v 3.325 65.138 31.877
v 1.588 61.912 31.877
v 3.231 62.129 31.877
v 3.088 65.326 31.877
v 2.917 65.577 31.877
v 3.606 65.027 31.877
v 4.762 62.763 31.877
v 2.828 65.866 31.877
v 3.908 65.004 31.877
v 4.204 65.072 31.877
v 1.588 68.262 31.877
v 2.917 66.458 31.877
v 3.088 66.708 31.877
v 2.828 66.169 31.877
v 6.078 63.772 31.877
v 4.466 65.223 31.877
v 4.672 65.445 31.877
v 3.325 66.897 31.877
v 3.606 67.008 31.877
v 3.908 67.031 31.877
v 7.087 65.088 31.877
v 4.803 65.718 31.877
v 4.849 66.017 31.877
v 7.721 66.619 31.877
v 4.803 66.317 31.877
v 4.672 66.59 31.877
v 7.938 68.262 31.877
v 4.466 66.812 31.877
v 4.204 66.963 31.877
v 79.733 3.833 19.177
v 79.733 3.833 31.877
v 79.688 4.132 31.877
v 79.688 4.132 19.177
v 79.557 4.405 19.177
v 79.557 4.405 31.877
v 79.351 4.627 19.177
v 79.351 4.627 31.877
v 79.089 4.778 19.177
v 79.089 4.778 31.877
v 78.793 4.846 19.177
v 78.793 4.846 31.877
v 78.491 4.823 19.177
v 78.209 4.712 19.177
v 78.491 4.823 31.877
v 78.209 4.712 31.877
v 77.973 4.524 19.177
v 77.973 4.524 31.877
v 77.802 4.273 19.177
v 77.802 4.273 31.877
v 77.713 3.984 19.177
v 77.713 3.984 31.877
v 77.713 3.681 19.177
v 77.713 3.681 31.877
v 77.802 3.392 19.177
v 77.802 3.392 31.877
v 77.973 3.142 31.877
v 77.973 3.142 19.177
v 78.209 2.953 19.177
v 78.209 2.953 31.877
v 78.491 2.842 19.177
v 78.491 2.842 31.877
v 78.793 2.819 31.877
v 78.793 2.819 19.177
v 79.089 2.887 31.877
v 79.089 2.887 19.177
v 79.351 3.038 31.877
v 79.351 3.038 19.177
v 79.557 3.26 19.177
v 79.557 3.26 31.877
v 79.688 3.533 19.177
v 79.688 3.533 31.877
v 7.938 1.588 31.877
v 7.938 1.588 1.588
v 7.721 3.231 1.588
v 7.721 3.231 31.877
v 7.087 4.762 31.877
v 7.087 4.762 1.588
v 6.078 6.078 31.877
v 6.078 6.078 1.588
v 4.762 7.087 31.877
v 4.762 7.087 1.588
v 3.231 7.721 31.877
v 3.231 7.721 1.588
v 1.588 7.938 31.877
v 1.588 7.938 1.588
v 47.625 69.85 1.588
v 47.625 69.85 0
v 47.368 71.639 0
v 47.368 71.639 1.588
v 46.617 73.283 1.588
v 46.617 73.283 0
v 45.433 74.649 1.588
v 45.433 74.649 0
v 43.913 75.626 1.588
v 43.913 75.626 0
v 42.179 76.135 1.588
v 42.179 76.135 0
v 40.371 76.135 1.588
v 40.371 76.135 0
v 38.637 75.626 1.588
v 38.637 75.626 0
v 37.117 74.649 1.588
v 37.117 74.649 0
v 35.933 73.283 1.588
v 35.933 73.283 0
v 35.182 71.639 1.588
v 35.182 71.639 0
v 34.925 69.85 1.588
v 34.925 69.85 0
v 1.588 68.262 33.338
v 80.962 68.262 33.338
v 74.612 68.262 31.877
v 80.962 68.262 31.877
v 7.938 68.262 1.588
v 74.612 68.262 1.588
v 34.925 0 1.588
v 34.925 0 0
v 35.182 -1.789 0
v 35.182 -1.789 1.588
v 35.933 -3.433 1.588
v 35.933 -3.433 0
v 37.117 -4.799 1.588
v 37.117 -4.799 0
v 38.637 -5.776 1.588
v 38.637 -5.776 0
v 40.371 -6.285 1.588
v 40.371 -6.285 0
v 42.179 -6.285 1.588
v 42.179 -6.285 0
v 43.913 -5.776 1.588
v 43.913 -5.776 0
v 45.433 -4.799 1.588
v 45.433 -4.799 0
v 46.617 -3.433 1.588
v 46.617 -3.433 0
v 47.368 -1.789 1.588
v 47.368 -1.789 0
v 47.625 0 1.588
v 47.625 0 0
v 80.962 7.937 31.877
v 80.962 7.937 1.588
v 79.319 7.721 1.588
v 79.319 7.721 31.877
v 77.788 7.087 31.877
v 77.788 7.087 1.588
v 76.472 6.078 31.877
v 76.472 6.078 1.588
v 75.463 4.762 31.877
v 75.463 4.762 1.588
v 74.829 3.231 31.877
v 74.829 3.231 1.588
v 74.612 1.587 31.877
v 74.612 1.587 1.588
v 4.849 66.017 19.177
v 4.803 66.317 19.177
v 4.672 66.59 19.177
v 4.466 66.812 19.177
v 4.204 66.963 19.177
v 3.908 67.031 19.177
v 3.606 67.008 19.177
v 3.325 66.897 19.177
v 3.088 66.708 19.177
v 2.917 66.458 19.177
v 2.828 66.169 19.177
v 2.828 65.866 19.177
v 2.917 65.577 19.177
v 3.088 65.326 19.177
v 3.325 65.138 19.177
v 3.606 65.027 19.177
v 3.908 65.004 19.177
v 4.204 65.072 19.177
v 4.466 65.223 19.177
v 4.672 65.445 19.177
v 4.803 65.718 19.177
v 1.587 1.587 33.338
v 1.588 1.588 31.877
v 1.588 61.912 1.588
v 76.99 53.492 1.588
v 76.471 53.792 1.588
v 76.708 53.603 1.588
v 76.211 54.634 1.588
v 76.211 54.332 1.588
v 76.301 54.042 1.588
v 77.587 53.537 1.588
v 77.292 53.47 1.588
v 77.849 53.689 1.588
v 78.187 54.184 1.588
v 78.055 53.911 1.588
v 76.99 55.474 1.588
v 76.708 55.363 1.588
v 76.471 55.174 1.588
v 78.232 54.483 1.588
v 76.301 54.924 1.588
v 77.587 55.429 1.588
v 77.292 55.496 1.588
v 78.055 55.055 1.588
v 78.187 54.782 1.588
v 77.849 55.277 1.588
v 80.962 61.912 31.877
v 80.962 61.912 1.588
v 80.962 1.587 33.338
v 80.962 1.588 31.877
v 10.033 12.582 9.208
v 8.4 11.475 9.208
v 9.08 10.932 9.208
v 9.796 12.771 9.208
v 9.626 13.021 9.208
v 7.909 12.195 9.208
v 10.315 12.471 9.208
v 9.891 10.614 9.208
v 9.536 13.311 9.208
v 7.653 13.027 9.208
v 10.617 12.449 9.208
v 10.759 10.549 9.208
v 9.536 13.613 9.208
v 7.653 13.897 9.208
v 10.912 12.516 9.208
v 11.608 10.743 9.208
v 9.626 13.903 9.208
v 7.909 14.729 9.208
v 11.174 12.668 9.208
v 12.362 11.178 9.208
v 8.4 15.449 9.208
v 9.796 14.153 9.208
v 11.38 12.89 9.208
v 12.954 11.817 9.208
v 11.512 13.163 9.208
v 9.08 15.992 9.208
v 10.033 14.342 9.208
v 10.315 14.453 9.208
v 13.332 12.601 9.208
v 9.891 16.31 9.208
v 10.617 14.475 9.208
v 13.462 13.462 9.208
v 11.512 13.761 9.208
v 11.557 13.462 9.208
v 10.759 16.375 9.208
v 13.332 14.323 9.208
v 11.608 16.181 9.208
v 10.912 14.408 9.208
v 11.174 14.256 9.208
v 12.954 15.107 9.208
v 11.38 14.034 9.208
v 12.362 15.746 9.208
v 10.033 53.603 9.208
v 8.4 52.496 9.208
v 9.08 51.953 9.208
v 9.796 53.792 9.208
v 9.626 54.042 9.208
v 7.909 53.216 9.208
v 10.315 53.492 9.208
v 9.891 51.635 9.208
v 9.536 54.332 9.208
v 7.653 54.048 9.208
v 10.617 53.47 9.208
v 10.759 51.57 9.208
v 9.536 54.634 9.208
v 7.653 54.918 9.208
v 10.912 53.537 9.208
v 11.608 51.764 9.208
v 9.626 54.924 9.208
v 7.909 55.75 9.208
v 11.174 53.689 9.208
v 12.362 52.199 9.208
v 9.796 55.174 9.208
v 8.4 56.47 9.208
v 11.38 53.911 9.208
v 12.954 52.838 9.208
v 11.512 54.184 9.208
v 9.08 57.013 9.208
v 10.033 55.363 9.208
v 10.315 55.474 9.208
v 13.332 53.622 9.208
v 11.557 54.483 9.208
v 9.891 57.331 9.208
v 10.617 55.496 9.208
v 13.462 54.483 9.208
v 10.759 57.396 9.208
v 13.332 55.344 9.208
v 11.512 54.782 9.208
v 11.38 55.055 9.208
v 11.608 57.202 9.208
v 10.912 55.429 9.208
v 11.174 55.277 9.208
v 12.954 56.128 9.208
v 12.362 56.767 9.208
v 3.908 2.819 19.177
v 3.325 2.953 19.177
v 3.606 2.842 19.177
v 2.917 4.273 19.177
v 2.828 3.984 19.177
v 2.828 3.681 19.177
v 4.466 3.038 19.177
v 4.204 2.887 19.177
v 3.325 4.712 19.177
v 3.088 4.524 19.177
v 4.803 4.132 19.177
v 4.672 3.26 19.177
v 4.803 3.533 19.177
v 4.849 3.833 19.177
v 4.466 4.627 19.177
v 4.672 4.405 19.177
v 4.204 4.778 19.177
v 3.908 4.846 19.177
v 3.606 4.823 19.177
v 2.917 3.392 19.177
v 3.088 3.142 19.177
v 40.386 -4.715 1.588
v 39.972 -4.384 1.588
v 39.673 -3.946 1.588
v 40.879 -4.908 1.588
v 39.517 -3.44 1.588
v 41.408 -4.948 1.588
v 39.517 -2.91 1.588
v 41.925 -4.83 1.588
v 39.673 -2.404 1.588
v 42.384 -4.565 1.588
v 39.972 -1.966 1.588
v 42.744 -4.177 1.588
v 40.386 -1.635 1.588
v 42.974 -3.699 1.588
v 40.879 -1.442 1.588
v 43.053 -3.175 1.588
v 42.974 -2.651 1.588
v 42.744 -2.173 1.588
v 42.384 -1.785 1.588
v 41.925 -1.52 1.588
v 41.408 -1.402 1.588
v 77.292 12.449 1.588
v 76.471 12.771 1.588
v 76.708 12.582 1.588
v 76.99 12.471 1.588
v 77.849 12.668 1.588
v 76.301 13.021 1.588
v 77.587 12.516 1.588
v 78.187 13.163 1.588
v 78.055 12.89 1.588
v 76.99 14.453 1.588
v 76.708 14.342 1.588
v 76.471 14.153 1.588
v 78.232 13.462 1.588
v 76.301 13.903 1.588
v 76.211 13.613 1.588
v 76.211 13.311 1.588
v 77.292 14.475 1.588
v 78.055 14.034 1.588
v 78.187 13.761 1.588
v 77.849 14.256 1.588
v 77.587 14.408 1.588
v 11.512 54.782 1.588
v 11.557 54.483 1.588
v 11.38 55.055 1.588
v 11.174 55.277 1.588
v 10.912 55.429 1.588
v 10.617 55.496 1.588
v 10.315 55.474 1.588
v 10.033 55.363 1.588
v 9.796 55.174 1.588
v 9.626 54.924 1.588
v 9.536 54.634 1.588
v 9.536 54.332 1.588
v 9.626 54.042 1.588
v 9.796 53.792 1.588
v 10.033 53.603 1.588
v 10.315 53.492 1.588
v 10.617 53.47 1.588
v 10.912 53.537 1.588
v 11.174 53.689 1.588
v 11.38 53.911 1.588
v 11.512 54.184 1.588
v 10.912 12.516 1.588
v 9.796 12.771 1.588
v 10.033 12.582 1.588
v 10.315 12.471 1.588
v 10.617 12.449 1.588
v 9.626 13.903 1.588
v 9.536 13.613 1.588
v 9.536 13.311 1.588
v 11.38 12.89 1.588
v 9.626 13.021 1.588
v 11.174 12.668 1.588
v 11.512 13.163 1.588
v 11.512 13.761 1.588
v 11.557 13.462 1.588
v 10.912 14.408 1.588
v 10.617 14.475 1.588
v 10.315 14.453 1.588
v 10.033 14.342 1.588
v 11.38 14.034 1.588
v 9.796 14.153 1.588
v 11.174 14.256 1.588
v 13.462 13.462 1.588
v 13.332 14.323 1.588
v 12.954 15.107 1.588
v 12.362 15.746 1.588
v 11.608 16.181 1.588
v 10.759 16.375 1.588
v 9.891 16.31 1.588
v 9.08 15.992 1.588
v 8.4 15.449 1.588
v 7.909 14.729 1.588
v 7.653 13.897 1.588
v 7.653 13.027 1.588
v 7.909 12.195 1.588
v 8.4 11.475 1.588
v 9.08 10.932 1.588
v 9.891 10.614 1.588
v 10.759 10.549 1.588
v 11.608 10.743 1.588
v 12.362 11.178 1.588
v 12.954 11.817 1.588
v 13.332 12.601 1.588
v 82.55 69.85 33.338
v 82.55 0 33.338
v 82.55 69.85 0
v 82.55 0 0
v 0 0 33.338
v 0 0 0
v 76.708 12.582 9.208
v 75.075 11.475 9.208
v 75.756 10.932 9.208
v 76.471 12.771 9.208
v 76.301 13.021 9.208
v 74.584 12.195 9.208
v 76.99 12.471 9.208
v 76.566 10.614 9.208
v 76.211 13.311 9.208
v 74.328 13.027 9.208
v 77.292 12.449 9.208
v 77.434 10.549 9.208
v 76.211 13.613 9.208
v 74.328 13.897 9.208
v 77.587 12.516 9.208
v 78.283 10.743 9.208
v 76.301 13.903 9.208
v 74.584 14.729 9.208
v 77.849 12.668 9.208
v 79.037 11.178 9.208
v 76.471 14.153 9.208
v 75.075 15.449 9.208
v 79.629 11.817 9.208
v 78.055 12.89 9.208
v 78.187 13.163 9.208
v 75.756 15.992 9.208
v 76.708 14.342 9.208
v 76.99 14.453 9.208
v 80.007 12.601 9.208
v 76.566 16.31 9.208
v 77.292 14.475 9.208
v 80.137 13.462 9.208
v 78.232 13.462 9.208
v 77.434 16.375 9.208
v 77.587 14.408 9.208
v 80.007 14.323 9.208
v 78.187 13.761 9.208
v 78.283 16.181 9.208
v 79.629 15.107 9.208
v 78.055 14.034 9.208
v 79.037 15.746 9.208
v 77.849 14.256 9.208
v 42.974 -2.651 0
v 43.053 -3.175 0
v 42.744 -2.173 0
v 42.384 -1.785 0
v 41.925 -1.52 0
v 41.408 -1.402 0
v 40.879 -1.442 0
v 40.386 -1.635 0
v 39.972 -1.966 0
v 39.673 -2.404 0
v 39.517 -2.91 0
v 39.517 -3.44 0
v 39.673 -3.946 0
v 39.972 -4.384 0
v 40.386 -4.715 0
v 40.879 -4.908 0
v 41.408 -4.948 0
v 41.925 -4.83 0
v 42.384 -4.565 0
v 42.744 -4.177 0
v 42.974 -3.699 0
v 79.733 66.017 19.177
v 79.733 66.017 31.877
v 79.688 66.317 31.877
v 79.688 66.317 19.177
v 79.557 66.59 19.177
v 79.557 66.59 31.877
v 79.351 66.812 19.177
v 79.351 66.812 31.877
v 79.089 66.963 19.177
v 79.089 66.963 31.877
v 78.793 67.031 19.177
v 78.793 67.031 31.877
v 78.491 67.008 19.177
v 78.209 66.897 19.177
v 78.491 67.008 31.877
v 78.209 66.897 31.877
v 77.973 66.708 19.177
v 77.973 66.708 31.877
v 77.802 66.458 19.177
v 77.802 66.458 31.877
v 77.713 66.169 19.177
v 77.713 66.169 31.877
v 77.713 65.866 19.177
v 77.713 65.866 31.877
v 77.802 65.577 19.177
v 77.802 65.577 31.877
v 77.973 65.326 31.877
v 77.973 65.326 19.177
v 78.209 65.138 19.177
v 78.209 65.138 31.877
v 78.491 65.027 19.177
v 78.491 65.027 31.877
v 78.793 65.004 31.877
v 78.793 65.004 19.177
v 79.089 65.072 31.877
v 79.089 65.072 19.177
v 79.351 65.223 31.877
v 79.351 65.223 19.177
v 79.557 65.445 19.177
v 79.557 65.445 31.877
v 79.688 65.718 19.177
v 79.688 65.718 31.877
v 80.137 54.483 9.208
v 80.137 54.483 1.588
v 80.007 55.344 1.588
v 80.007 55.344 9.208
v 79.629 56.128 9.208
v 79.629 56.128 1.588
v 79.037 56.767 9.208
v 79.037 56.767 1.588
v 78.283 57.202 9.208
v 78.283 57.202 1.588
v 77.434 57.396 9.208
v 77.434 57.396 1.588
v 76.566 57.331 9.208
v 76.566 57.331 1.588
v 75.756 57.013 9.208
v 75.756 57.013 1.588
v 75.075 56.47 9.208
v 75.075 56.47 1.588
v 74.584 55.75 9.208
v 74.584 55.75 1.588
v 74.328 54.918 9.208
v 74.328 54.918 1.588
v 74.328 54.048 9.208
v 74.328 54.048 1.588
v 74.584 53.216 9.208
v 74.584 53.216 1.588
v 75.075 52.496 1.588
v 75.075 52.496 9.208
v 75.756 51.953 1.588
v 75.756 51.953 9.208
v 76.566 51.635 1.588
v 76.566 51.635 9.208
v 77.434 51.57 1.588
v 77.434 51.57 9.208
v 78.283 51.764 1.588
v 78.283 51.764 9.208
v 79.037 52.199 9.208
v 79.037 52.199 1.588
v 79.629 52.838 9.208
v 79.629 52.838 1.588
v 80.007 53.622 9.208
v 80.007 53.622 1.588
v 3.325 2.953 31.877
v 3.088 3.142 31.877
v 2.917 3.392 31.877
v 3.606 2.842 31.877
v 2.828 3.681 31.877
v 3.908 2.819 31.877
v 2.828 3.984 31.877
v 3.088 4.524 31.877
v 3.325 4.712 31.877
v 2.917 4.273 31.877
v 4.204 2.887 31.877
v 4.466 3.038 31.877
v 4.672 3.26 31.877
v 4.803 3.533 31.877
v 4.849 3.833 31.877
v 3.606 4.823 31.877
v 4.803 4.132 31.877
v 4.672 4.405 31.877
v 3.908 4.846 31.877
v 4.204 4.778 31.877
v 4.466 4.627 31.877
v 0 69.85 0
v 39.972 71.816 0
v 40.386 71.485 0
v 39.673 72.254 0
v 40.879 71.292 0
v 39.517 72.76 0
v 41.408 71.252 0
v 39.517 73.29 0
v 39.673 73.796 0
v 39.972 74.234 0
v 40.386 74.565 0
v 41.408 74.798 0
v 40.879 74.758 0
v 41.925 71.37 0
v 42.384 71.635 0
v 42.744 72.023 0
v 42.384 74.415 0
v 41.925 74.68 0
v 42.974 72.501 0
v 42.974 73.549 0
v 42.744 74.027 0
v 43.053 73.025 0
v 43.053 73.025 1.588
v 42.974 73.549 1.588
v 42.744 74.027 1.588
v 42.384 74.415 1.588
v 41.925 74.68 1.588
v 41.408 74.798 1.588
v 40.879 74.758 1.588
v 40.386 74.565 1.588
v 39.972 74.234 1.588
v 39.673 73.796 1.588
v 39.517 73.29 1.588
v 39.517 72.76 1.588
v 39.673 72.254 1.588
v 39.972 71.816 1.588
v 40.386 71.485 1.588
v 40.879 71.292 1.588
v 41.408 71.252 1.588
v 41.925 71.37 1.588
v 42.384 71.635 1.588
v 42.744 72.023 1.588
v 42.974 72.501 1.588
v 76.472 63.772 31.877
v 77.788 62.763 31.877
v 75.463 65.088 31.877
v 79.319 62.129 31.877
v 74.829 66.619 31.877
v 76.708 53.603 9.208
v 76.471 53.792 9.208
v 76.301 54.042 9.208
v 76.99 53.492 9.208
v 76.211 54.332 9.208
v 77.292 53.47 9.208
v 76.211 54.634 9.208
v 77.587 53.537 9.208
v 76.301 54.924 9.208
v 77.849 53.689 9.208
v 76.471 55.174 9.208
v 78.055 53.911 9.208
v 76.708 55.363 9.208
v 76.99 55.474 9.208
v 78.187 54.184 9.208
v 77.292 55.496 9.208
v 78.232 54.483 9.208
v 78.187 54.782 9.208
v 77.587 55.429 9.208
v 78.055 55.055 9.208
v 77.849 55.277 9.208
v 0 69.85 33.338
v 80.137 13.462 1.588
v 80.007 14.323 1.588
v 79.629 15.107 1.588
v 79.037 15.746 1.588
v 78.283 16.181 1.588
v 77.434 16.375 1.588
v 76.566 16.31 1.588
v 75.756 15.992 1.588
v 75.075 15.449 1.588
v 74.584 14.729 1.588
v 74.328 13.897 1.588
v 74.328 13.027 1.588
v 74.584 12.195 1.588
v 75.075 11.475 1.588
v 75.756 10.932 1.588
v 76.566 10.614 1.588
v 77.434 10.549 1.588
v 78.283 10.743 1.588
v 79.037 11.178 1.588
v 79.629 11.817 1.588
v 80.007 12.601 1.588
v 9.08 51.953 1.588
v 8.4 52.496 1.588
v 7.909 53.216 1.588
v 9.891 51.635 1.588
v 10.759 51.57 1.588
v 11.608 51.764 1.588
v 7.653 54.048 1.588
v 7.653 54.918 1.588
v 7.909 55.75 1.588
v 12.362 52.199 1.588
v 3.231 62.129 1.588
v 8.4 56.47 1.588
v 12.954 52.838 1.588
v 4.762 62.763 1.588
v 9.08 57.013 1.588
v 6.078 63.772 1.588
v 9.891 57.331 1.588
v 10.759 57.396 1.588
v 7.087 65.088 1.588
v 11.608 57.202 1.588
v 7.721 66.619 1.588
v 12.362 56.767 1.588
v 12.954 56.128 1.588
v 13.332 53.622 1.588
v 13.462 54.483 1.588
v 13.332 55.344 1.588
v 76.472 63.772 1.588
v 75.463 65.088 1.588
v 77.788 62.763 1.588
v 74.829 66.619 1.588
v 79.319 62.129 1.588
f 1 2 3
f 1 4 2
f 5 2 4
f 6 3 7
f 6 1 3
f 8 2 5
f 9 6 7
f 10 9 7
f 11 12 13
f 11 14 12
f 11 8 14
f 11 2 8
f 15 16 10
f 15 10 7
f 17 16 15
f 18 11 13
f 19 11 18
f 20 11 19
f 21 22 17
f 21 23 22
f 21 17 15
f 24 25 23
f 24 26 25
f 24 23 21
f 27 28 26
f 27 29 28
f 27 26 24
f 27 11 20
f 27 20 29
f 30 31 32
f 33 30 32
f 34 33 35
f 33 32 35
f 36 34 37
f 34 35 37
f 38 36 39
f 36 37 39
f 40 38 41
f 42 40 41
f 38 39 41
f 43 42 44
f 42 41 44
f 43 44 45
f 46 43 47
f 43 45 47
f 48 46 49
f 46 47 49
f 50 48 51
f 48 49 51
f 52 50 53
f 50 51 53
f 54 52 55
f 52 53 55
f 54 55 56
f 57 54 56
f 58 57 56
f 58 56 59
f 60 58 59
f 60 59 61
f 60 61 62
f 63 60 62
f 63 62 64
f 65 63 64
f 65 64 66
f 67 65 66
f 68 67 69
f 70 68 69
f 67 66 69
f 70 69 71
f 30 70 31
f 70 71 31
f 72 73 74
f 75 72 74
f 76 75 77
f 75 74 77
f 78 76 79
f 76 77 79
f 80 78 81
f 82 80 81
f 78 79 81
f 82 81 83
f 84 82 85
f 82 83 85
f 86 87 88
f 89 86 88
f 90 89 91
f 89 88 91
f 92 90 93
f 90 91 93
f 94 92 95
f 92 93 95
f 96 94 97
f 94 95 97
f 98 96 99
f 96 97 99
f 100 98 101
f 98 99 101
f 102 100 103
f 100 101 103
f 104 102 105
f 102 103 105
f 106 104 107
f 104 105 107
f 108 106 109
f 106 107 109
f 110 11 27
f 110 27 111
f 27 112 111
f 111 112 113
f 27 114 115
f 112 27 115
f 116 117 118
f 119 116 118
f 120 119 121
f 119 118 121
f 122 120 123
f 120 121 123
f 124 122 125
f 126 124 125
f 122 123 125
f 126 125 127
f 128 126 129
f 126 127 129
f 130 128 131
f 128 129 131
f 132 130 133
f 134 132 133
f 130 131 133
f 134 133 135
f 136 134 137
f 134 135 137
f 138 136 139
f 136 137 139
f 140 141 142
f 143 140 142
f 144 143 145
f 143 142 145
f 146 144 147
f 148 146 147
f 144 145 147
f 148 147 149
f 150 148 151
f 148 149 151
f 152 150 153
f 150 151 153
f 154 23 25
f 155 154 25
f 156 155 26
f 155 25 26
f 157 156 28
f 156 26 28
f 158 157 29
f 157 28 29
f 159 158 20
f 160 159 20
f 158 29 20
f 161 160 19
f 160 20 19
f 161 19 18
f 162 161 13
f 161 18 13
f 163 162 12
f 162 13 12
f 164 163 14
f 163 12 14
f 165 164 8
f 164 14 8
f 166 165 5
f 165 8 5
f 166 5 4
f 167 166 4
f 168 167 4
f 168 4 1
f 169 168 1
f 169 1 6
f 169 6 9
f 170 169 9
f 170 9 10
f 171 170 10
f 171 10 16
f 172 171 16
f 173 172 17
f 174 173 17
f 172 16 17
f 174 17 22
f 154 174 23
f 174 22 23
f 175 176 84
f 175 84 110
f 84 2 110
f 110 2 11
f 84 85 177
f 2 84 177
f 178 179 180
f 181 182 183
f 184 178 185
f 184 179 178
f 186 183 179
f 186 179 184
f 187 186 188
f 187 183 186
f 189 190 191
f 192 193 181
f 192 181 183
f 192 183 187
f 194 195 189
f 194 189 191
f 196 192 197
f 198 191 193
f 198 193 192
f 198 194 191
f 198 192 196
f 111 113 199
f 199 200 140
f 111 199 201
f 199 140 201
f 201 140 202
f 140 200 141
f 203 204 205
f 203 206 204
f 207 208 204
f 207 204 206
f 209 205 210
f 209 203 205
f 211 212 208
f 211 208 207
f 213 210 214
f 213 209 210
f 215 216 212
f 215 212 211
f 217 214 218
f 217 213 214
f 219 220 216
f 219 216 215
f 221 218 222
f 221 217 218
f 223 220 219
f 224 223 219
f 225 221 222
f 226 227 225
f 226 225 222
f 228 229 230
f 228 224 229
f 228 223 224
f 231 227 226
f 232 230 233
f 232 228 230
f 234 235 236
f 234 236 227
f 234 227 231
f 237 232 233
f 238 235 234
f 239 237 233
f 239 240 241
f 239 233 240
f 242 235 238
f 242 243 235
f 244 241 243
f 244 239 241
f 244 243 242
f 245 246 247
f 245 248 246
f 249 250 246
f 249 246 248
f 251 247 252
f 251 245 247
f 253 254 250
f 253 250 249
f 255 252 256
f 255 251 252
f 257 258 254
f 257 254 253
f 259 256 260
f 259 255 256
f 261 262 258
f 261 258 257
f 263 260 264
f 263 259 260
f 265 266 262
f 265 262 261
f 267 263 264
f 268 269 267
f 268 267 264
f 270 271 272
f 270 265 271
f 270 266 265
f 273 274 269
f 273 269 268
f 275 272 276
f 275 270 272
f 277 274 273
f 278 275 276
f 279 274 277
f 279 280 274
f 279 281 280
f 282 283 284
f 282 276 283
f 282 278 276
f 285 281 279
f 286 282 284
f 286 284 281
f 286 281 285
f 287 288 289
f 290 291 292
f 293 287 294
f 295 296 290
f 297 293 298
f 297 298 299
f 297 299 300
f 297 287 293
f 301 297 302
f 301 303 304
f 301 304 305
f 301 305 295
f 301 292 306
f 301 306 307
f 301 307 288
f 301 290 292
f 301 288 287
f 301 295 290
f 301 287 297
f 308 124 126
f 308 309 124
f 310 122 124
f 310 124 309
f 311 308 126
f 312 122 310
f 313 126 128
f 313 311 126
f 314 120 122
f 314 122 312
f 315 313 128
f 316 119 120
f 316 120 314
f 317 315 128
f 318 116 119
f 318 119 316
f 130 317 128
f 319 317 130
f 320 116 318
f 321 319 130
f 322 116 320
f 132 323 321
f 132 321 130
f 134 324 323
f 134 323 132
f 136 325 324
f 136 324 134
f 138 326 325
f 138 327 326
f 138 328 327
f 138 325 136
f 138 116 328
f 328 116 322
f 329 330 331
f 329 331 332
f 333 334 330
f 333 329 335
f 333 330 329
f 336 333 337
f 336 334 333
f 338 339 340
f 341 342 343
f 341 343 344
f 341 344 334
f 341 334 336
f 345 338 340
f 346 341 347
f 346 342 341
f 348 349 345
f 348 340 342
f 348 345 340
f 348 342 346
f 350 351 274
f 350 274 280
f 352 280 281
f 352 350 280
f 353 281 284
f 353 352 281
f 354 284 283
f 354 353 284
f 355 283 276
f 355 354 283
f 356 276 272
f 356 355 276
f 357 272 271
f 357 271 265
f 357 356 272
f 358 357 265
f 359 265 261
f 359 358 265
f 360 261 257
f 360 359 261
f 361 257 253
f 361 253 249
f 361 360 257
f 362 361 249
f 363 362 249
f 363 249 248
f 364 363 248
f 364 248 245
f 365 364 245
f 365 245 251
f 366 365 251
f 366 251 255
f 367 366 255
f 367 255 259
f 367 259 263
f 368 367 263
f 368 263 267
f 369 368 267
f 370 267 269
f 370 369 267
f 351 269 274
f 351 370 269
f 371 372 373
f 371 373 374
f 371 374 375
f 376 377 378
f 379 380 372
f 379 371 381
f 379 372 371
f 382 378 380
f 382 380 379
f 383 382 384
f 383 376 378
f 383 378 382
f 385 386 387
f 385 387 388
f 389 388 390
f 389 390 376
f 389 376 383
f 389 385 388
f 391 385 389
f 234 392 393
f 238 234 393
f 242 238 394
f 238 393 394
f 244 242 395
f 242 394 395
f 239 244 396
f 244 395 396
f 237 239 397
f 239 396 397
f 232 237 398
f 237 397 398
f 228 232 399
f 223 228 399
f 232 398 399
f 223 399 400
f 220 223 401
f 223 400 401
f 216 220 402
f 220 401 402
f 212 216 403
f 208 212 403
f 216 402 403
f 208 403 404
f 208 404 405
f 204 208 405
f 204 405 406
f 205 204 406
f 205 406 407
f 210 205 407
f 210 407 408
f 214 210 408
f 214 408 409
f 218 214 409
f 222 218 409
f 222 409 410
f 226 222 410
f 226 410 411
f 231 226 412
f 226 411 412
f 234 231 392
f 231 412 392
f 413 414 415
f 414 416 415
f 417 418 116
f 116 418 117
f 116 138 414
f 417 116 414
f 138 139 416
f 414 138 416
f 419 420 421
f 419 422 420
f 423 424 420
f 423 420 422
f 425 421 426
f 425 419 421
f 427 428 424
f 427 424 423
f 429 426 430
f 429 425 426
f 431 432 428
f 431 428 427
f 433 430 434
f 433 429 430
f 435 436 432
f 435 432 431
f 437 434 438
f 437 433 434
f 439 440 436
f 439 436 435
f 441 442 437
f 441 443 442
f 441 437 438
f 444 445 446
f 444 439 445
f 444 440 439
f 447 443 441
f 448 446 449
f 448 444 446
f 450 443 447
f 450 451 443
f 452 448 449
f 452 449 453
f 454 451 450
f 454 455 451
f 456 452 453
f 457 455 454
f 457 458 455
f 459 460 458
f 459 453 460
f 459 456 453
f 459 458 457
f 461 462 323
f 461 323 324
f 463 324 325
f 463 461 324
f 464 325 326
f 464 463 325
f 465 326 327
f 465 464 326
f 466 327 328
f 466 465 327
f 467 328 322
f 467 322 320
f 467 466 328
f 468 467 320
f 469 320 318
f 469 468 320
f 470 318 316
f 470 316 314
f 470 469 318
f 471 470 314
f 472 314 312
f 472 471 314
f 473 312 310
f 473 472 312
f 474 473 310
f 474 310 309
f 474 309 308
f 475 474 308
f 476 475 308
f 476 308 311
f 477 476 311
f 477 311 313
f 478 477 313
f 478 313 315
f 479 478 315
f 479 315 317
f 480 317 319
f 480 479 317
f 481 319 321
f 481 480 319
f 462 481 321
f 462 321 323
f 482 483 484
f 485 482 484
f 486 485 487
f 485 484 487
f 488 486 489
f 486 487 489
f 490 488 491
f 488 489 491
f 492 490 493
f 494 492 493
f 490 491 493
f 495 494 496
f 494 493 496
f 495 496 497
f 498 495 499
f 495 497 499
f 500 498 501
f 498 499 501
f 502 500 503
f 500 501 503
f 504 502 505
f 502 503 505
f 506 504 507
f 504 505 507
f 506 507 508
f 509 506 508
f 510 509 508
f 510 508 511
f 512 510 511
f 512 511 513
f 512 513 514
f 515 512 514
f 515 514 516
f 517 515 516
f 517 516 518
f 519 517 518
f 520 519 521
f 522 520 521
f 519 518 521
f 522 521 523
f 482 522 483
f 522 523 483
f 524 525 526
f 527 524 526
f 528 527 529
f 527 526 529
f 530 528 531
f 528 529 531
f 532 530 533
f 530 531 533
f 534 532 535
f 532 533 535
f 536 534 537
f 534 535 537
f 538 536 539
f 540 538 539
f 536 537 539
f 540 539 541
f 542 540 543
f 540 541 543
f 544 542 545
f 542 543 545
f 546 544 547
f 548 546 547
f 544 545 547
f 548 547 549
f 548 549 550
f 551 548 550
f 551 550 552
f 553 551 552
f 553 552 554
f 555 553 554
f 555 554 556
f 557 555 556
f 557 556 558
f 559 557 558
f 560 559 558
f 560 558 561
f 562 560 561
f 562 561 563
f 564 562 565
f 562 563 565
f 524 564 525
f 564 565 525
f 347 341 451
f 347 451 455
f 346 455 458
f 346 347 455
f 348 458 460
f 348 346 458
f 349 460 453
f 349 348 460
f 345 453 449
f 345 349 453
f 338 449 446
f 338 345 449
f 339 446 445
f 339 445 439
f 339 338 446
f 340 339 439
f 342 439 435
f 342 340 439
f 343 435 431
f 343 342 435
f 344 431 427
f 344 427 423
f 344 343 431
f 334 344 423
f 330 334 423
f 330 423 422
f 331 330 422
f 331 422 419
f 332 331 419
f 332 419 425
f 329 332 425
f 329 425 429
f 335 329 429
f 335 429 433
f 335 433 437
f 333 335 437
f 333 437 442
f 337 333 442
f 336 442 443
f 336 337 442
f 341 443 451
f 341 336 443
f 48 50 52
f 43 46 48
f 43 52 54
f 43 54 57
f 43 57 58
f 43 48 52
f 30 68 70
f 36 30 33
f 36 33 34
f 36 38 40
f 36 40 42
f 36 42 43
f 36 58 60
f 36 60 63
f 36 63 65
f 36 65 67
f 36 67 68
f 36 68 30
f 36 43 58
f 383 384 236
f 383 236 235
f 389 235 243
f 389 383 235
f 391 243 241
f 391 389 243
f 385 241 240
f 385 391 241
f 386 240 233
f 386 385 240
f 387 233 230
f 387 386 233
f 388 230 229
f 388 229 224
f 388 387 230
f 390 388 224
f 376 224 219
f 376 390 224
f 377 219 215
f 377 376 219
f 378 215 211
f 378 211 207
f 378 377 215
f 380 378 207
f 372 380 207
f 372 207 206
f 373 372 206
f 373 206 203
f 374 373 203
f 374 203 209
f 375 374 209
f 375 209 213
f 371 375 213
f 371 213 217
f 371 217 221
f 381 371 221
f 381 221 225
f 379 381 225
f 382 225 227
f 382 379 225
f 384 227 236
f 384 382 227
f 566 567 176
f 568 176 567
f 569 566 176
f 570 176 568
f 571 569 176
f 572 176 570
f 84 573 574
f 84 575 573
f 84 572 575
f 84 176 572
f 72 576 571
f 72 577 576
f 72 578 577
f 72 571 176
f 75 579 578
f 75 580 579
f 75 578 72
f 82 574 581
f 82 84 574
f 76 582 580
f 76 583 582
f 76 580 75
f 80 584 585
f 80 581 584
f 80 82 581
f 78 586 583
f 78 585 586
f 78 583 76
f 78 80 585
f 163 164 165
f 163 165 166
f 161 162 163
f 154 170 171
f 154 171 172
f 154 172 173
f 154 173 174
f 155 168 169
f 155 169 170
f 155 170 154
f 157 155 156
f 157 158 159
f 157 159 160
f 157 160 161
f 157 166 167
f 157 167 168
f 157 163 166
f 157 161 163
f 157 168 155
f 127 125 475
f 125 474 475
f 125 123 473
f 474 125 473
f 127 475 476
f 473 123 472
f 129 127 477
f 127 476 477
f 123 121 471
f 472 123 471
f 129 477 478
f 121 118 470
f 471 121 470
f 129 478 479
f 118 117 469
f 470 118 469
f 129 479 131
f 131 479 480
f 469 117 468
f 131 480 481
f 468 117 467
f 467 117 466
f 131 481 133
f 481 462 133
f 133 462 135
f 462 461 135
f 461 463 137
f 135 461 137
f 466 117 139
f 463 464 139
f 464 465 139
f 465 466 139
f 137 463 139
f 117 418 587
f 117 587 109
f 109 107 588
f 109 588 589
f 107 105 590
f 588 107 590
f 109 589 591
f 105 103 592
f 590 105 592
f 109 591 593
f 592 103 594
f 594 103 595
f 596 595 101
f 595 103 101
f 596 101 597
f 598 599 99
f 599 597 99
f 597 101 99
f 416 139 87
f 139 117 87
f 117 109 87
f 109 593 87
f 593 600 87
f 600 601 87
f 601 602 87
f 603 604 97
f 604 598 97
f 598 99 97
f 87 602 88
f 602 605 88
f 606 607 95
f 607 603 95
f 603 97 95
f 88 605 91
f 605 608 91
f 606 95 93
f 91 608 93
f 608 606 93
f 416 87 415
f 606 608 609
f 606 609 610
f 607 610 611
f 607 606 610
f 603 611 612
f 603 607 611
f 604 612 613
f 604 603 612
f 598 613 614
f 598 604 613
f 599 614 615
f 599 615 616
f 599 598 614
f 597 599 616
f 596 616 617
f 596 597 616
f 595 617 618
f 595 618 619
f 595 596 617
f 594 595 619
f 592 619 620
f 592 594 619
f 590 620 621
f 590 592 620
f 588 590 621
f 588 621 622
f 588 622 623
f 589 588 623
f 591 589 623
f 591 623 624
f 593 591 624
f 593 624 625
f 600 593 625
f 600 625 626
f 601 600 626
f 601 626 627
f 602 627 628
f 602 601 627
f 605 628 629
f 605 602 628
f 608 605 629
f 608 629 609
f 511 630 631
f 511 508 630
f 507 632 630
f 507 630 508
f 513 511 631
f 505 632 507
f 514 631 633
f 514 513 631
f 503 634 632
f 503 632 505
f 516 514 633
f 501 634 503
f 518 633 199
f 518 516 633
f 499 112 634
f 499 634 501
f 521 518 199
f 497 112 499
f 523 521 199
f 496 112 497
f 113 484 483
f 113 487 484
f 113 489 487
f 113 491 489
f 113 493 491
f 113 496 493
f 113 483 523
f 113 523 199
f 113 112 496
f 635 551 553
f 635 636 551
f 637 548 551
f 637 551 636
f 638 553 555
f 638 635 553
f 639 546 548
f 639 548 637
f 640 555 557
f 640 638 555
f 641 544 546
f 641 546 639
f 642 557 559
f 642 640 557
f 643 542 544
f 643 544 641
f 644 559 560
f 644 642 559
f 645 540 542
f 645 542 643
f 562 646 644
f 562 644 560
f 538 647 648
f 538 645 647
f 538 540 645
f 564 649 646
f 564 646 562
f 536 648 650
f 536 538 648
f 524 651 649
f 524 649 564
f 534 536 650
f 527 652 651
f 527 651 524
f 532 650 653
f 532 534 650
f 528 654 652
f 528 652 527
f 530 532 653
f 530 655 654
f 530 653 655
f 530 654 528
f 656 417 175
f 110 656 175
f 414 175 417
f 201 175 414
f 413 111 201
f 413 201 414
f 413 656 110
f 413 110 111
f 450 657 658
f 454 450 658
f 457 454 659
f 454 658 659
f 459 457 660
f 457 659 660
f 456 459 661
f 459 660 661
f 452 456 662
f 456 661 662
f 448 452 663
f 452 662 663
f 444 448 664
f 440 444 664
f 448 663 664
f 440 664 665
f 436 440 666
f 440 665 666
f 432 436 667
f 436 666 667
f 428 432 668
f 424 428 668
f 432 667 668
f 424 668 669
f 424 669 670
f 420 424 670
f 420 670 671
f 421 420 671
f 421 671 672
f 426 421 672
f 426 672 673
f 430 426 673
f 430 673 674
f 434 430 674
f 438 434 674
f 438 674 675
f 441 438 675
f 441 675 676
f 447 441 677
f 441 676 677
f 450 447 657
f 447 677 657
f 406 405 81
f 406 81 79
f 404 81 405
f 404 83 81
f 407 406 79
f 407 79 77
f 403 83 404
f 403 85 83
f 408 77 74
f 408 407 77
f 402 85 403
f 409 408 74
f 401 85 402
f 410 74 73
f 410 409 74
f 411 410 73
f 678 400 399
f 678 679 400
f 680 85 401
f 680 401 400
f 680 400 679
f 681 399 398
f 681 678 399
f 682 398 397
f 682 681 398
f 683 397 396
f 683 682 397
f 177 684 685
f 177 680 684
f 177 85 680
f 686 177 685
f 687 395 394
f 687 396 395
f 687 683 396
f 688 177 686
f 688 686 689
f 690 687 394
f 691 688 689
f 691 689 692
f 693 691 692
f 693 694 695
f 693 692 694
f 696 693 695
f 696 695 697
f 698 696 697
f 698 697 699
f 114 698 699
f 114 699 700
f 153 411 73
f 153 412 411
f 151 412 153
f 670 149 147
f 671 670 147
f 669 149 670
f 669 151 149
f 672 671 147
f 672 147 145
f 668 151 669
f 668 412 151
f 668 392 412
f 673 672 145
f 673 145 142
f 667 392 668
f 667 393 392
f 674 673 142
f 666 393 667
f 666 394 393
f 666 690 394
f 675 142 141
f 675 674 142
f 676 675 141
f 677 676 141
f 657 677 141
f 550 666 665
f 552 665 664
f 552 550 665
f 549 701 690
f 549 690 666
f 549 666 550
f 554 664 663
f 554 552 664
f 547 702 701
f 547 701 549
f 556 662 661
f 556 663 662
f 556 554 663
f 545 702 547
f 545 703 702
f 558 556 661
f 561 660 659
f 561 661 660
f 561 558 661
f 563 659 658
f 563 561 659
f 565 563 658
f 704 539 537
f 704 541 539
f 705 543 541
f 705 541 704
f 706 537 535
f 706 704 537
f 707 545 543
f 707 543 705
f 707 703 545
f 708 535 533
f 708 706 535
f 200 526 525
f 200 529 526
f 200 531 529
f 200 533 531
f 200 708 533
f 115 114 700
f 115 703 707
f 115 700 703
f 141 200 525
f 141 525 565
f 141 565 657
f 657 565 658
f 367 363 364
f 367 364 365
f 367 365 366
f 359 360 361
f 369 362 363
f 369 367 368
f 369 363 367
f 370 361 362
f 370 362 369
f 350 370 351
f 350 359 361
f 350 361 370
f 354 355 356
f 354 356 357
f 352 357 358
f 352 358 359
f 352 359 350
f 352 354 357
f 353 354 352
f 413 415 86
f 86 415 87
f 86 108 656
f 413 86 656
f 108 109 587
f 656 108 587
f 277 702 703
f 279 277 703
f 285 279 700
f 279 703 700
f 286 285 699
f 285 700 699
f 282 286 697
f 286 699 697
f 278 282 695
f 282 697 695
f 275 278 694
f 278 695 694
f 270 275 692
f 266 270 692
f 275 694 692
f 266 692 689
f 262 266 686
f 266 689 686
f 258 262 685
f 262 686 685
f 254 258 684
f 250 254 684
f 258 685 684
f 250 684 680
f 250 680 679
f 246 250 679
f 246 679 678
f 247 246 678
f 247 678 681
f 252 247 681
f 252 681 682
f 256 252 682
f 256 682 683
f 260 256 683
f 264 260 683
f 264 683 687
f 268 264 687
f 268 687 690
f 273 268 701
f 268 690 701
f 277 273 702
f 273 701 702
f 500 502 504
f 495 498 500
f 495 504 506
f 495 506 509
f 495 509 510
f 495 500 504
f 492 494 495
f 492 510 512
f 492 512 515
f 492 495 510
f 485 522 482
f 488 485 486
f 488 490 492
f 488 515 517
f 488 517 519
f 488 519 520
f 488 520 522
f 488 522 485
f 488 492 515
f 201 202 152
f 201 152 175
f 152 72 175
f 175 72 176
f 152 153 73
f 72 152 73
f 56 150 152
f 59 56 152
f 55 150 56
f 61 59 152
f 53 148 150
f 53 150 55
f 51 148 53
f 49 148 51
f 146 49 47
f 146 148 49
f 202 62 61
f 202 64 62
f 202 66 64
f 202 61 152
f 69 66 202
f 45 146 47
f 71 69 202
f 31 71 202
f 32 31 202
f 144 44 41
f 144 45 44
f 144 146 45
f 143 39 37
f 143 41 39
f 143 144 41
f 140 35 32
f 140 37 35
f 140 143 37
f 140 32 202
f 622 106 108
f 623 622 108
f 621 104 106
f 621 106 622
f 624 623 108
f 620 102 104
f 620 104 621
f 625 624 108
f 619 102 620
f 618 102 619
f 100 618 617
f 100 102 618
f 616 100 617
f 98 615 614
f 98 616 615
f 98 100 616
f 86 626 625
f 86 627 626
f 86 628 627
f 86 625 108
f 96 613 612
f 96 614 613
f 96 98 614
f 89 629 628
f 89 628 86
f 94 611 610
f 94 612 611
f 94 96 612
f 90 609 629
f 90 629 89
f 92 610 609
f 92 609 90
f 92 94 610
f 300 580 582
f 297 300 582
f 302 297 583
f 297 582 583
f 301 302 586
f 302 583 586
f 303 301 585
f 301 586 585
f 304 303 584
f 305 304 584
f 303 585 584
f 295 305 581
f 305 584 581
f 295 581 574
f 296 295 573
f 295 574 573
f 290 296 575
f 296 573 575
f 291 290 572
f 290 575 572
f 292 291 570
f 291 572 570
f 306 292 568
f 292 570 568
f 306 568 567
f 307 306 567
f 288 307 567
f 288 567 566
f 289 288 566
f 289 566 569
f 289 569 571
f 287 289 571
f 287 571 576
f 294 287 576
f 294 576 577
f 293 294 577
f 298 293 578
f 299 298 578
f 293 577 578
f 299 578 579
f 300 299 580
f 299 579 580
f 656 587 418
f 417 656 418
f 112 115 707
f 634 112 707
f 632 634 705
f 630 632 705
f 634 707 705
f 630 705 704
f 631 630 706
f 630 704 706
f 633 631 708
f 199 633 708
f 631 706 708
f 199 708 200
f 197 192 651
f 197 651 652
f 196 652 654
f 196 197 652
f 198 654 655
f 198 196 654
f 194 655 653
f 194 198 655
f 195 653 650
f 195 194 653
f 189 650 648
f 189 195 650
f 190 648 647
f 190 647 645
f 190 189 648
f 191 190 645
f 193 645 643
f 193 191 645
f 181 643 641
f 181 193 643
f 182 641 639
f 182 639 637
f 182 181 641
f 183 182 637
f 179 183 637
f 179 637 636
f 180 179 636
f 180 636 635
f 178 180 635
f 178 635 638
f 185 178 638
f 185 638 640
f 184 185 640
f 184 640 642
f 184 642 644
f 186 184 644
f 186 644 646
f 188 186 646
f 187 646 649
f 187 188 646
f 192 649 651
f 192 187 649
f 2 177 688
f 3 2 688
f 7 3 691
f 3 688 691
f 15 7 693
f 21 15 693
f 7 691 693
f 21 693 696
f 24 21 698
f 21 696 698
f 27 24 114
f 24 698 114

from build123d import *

# Parameters (mm, degrees)
F0_R      = 1.778
F1_DEPTH  = 1.5875
F3_DEPTH  = 31.75
F4_R      = 2.921
F4_R_2    = 1.016
F5_DEPTH  = 7.62
F6_DEPTH  = 30.2895
F8_R      = 1.016
F9_DEPTH  = 12.7
F7_R      = 1.016
F10_DEPTH = 12.7
F11_R     = 1.016
F12_DEPTH = 12.7
F13_R     = 1.016
F14_DEPTH = 12.7


with BuildPart() as f1:
    # F0 (on Top) → F1 (new body)
    with BuildSketch(Plane.XY):
        with BuildLine():
            ThreePointArc((34.925, 0), (41.275, 6.35), (47.625, 0))
            Line((47.625, 0), (82.55, 0))
            Line((82.55, 0), (82.55, 69.85))
            Line((82.55, 69.85), (47.625, 69.85))
            ThreePointArc((47.625, 69.85), (41.275, 63.5), (34.925, 69.85))
            Line((34.925, 69.85), (0, 69.85))
            Line((0, 69.85), (0, 0))
            Line((0, 0), (34.925, 0))
        make_face()
        with BuildLine():
            Line((34.925, 69.85), (47.625, 69.85))
            ThreePointArc((47.625, 69.85), (41.275, 76.2), (34.925, 69.85))
        make_face()
        with Locations((41.275, 73.025)):
            Circle(F0_R, mode=Mode.SUBTRACT)
        with BuildLine():
            ThreePointArc((34.925, 69.85), (41.275, 63.5), (47.625, 69.85))
            Line((47.625, 69.85), (34.925, 69.85))
        make_face()
        with BuildLine():
            Line((34.925, 0), (47.625, 0))
            ThreePointArc((47.625, 0), (41.275, 6.35), (34.925, 0))
        make_face()
        with BuildLine():
            ThreePointArc((34.925, 0), (41.275, -6.35), (47.625, 0))
            Line((47.625, 0), (34.925, 0))
        make_face()
        with Locations((41.275, -3.175)):
            Circle(F0_R, mode=Mode.SUBTRACT)
    extrude(amount=F1_DEPTH)

    # F2 (on face) → F3 (join)
    with BuildSketch(Plane.XY.offset(1.5875)):
        Polygon((1.5875, 68.2625), (1.5875, 69.85), (0, 69.85), (0, 1.5875), (1.5875, 1.5875), (1.5875, 7.9375), (1.5875, 61.9125), align=None)
        Polygon((47.625, 0), (80.9625, 0), (80.9625, 1.5875), (74.6125, 1.5875), (7.9375, 1.5875), (1.5875, 1.5875), (0, 1.5875), (0, 0), (34.925, 0), align=None)
        Polygon((82.55, 0), (82.55, 69.85), (80.9625, 69.85), (80.9625, 68.2625), (80.9625, 61.9125), (80.9625, 7.9375), (80.9625, 1.5875), (80.9625, 0), align=None)
        Polygon((80.9625, 68.2625), (80.9625, 69.85), (47.625, 69.85), (34.925, 69.85), (1.5875, 69.85), (1.5875, 68.2625), (7.9375, 68.2625), (74.6125, 68.2625), align=None)
    extrude(amount=F3_DEPTH)

    # F4 (on face) → F5 (join)
    with BuildSketch(Plane.XY.offset(1.5875)):
        with Locations((10.541, 13.462)):
            Circle(F4_R)
        with Locations((10.541, 13.462)):
            Circle(F4_R_2, mode=Mode.SUBTRACT)
        with Locations((77.216, 13.462)):
            Circle(F4_R)
        with Locations((77.216, 13.462)):
            Circle(F4_R_2, mode=Mode.SUBTRACT)
        with Locations((10.541, 54.483)):
            Circle(F4_R)
        with Locations((10.541, 54.483)):
            Circle(F4_R_2, mode=Mode.SUBTRACT)
        with Locations((77.216, 54.483)):
            Circle(F4_R)
        with Locations((77.216, 54.483)):
            Circle(F4_R_2, mode=Mode.SUBTRACT)
    extrude(amount=F5_DEPTH)

    # F2 (on face) → F6 (join)
    with BuildSketch(Plane.XY.offset(1.5875)):
        with BuildLine():
            ThreePointArc((1.5875, 61.9125), (6.0776280605, 63.7723719395), (7.9375, 68.2625))
            Line((7.9375, 68.2625), (1.5875, 68.2625))
            Line((1.5875, 68.2625), (1.5875, 61.9125))
        make_face()
        with BuildLine():
            Line((80.9625, 61.9125), (80.9625, 68.2625))
            Line((80.9625, 68.2625), (74.6125, 68.2625))
            ThreePointArc((74.6125, 68.2625), (76.4723719395, 63.7723719395), (80.9625, 61.9125))
        make_face()
        with BuildLine():
            Line((1.5875, 1.5875), (7.9375, 1.5875))
            ThreePointArc((7.9375, 1.5875), (6.0776280605, 6.0776280605), (1.5875, 7.9375))
            Line((1.5875, 7.9375), (1.5875, 1.5875))
        make_face()
        with BuildLine():
            Line((74.6125, 1.5875), (80.9625, 1.5875))
            Line((80.9625, 1.5875), (80.9625, 7.9375))
            ThreePointArc((80.9625, 7.9375), (76.4723719395, 6.0776280605), (74.6125, 1.5875))
        make_face()
    extrude(amount=F6_DEPTH)

    # F8 (on face) → F9 (cut)
    with BuildSketch(Plane.XY.offset(31.877)):
        with Locations((78.7174359697, 3.8325640303)):
            Circle(F8_R)
    extrude(amount=-F9_DEPTH, mode=Mode.SUBTRACT)

    # F7 (on face) → F10 (cut)
    with BuildSketch(Plane.XY.offset(31.877)):
        with Locations((3.8325640303, 3.8325640303)):
            Circle(F7_R)
    extrude(amount=-F10_DEPTH, mode=Mode.SUBTRACT)

    # F11 (on face) → F12 (cut)
    with BuildSketch(Plane.XY.offset(31.877)):
        with Locations((3.8325640303, 66.0174359697)):
            Circle(F11_R)
    extrude(amount=-F12_DEPTH, mode=Mode.SUBTRACT)

    # F13 (on face) → F14 (cut)
    with BuildSketch(Plane.XY.offset(31.877)):
        with Locations((78.7174359697, 66.0174359697)):
            Circle(F13_R)
    extrude(amount=-F14_DEPTH, mode=Mode.SUBTRACT)


solid = f1.part
